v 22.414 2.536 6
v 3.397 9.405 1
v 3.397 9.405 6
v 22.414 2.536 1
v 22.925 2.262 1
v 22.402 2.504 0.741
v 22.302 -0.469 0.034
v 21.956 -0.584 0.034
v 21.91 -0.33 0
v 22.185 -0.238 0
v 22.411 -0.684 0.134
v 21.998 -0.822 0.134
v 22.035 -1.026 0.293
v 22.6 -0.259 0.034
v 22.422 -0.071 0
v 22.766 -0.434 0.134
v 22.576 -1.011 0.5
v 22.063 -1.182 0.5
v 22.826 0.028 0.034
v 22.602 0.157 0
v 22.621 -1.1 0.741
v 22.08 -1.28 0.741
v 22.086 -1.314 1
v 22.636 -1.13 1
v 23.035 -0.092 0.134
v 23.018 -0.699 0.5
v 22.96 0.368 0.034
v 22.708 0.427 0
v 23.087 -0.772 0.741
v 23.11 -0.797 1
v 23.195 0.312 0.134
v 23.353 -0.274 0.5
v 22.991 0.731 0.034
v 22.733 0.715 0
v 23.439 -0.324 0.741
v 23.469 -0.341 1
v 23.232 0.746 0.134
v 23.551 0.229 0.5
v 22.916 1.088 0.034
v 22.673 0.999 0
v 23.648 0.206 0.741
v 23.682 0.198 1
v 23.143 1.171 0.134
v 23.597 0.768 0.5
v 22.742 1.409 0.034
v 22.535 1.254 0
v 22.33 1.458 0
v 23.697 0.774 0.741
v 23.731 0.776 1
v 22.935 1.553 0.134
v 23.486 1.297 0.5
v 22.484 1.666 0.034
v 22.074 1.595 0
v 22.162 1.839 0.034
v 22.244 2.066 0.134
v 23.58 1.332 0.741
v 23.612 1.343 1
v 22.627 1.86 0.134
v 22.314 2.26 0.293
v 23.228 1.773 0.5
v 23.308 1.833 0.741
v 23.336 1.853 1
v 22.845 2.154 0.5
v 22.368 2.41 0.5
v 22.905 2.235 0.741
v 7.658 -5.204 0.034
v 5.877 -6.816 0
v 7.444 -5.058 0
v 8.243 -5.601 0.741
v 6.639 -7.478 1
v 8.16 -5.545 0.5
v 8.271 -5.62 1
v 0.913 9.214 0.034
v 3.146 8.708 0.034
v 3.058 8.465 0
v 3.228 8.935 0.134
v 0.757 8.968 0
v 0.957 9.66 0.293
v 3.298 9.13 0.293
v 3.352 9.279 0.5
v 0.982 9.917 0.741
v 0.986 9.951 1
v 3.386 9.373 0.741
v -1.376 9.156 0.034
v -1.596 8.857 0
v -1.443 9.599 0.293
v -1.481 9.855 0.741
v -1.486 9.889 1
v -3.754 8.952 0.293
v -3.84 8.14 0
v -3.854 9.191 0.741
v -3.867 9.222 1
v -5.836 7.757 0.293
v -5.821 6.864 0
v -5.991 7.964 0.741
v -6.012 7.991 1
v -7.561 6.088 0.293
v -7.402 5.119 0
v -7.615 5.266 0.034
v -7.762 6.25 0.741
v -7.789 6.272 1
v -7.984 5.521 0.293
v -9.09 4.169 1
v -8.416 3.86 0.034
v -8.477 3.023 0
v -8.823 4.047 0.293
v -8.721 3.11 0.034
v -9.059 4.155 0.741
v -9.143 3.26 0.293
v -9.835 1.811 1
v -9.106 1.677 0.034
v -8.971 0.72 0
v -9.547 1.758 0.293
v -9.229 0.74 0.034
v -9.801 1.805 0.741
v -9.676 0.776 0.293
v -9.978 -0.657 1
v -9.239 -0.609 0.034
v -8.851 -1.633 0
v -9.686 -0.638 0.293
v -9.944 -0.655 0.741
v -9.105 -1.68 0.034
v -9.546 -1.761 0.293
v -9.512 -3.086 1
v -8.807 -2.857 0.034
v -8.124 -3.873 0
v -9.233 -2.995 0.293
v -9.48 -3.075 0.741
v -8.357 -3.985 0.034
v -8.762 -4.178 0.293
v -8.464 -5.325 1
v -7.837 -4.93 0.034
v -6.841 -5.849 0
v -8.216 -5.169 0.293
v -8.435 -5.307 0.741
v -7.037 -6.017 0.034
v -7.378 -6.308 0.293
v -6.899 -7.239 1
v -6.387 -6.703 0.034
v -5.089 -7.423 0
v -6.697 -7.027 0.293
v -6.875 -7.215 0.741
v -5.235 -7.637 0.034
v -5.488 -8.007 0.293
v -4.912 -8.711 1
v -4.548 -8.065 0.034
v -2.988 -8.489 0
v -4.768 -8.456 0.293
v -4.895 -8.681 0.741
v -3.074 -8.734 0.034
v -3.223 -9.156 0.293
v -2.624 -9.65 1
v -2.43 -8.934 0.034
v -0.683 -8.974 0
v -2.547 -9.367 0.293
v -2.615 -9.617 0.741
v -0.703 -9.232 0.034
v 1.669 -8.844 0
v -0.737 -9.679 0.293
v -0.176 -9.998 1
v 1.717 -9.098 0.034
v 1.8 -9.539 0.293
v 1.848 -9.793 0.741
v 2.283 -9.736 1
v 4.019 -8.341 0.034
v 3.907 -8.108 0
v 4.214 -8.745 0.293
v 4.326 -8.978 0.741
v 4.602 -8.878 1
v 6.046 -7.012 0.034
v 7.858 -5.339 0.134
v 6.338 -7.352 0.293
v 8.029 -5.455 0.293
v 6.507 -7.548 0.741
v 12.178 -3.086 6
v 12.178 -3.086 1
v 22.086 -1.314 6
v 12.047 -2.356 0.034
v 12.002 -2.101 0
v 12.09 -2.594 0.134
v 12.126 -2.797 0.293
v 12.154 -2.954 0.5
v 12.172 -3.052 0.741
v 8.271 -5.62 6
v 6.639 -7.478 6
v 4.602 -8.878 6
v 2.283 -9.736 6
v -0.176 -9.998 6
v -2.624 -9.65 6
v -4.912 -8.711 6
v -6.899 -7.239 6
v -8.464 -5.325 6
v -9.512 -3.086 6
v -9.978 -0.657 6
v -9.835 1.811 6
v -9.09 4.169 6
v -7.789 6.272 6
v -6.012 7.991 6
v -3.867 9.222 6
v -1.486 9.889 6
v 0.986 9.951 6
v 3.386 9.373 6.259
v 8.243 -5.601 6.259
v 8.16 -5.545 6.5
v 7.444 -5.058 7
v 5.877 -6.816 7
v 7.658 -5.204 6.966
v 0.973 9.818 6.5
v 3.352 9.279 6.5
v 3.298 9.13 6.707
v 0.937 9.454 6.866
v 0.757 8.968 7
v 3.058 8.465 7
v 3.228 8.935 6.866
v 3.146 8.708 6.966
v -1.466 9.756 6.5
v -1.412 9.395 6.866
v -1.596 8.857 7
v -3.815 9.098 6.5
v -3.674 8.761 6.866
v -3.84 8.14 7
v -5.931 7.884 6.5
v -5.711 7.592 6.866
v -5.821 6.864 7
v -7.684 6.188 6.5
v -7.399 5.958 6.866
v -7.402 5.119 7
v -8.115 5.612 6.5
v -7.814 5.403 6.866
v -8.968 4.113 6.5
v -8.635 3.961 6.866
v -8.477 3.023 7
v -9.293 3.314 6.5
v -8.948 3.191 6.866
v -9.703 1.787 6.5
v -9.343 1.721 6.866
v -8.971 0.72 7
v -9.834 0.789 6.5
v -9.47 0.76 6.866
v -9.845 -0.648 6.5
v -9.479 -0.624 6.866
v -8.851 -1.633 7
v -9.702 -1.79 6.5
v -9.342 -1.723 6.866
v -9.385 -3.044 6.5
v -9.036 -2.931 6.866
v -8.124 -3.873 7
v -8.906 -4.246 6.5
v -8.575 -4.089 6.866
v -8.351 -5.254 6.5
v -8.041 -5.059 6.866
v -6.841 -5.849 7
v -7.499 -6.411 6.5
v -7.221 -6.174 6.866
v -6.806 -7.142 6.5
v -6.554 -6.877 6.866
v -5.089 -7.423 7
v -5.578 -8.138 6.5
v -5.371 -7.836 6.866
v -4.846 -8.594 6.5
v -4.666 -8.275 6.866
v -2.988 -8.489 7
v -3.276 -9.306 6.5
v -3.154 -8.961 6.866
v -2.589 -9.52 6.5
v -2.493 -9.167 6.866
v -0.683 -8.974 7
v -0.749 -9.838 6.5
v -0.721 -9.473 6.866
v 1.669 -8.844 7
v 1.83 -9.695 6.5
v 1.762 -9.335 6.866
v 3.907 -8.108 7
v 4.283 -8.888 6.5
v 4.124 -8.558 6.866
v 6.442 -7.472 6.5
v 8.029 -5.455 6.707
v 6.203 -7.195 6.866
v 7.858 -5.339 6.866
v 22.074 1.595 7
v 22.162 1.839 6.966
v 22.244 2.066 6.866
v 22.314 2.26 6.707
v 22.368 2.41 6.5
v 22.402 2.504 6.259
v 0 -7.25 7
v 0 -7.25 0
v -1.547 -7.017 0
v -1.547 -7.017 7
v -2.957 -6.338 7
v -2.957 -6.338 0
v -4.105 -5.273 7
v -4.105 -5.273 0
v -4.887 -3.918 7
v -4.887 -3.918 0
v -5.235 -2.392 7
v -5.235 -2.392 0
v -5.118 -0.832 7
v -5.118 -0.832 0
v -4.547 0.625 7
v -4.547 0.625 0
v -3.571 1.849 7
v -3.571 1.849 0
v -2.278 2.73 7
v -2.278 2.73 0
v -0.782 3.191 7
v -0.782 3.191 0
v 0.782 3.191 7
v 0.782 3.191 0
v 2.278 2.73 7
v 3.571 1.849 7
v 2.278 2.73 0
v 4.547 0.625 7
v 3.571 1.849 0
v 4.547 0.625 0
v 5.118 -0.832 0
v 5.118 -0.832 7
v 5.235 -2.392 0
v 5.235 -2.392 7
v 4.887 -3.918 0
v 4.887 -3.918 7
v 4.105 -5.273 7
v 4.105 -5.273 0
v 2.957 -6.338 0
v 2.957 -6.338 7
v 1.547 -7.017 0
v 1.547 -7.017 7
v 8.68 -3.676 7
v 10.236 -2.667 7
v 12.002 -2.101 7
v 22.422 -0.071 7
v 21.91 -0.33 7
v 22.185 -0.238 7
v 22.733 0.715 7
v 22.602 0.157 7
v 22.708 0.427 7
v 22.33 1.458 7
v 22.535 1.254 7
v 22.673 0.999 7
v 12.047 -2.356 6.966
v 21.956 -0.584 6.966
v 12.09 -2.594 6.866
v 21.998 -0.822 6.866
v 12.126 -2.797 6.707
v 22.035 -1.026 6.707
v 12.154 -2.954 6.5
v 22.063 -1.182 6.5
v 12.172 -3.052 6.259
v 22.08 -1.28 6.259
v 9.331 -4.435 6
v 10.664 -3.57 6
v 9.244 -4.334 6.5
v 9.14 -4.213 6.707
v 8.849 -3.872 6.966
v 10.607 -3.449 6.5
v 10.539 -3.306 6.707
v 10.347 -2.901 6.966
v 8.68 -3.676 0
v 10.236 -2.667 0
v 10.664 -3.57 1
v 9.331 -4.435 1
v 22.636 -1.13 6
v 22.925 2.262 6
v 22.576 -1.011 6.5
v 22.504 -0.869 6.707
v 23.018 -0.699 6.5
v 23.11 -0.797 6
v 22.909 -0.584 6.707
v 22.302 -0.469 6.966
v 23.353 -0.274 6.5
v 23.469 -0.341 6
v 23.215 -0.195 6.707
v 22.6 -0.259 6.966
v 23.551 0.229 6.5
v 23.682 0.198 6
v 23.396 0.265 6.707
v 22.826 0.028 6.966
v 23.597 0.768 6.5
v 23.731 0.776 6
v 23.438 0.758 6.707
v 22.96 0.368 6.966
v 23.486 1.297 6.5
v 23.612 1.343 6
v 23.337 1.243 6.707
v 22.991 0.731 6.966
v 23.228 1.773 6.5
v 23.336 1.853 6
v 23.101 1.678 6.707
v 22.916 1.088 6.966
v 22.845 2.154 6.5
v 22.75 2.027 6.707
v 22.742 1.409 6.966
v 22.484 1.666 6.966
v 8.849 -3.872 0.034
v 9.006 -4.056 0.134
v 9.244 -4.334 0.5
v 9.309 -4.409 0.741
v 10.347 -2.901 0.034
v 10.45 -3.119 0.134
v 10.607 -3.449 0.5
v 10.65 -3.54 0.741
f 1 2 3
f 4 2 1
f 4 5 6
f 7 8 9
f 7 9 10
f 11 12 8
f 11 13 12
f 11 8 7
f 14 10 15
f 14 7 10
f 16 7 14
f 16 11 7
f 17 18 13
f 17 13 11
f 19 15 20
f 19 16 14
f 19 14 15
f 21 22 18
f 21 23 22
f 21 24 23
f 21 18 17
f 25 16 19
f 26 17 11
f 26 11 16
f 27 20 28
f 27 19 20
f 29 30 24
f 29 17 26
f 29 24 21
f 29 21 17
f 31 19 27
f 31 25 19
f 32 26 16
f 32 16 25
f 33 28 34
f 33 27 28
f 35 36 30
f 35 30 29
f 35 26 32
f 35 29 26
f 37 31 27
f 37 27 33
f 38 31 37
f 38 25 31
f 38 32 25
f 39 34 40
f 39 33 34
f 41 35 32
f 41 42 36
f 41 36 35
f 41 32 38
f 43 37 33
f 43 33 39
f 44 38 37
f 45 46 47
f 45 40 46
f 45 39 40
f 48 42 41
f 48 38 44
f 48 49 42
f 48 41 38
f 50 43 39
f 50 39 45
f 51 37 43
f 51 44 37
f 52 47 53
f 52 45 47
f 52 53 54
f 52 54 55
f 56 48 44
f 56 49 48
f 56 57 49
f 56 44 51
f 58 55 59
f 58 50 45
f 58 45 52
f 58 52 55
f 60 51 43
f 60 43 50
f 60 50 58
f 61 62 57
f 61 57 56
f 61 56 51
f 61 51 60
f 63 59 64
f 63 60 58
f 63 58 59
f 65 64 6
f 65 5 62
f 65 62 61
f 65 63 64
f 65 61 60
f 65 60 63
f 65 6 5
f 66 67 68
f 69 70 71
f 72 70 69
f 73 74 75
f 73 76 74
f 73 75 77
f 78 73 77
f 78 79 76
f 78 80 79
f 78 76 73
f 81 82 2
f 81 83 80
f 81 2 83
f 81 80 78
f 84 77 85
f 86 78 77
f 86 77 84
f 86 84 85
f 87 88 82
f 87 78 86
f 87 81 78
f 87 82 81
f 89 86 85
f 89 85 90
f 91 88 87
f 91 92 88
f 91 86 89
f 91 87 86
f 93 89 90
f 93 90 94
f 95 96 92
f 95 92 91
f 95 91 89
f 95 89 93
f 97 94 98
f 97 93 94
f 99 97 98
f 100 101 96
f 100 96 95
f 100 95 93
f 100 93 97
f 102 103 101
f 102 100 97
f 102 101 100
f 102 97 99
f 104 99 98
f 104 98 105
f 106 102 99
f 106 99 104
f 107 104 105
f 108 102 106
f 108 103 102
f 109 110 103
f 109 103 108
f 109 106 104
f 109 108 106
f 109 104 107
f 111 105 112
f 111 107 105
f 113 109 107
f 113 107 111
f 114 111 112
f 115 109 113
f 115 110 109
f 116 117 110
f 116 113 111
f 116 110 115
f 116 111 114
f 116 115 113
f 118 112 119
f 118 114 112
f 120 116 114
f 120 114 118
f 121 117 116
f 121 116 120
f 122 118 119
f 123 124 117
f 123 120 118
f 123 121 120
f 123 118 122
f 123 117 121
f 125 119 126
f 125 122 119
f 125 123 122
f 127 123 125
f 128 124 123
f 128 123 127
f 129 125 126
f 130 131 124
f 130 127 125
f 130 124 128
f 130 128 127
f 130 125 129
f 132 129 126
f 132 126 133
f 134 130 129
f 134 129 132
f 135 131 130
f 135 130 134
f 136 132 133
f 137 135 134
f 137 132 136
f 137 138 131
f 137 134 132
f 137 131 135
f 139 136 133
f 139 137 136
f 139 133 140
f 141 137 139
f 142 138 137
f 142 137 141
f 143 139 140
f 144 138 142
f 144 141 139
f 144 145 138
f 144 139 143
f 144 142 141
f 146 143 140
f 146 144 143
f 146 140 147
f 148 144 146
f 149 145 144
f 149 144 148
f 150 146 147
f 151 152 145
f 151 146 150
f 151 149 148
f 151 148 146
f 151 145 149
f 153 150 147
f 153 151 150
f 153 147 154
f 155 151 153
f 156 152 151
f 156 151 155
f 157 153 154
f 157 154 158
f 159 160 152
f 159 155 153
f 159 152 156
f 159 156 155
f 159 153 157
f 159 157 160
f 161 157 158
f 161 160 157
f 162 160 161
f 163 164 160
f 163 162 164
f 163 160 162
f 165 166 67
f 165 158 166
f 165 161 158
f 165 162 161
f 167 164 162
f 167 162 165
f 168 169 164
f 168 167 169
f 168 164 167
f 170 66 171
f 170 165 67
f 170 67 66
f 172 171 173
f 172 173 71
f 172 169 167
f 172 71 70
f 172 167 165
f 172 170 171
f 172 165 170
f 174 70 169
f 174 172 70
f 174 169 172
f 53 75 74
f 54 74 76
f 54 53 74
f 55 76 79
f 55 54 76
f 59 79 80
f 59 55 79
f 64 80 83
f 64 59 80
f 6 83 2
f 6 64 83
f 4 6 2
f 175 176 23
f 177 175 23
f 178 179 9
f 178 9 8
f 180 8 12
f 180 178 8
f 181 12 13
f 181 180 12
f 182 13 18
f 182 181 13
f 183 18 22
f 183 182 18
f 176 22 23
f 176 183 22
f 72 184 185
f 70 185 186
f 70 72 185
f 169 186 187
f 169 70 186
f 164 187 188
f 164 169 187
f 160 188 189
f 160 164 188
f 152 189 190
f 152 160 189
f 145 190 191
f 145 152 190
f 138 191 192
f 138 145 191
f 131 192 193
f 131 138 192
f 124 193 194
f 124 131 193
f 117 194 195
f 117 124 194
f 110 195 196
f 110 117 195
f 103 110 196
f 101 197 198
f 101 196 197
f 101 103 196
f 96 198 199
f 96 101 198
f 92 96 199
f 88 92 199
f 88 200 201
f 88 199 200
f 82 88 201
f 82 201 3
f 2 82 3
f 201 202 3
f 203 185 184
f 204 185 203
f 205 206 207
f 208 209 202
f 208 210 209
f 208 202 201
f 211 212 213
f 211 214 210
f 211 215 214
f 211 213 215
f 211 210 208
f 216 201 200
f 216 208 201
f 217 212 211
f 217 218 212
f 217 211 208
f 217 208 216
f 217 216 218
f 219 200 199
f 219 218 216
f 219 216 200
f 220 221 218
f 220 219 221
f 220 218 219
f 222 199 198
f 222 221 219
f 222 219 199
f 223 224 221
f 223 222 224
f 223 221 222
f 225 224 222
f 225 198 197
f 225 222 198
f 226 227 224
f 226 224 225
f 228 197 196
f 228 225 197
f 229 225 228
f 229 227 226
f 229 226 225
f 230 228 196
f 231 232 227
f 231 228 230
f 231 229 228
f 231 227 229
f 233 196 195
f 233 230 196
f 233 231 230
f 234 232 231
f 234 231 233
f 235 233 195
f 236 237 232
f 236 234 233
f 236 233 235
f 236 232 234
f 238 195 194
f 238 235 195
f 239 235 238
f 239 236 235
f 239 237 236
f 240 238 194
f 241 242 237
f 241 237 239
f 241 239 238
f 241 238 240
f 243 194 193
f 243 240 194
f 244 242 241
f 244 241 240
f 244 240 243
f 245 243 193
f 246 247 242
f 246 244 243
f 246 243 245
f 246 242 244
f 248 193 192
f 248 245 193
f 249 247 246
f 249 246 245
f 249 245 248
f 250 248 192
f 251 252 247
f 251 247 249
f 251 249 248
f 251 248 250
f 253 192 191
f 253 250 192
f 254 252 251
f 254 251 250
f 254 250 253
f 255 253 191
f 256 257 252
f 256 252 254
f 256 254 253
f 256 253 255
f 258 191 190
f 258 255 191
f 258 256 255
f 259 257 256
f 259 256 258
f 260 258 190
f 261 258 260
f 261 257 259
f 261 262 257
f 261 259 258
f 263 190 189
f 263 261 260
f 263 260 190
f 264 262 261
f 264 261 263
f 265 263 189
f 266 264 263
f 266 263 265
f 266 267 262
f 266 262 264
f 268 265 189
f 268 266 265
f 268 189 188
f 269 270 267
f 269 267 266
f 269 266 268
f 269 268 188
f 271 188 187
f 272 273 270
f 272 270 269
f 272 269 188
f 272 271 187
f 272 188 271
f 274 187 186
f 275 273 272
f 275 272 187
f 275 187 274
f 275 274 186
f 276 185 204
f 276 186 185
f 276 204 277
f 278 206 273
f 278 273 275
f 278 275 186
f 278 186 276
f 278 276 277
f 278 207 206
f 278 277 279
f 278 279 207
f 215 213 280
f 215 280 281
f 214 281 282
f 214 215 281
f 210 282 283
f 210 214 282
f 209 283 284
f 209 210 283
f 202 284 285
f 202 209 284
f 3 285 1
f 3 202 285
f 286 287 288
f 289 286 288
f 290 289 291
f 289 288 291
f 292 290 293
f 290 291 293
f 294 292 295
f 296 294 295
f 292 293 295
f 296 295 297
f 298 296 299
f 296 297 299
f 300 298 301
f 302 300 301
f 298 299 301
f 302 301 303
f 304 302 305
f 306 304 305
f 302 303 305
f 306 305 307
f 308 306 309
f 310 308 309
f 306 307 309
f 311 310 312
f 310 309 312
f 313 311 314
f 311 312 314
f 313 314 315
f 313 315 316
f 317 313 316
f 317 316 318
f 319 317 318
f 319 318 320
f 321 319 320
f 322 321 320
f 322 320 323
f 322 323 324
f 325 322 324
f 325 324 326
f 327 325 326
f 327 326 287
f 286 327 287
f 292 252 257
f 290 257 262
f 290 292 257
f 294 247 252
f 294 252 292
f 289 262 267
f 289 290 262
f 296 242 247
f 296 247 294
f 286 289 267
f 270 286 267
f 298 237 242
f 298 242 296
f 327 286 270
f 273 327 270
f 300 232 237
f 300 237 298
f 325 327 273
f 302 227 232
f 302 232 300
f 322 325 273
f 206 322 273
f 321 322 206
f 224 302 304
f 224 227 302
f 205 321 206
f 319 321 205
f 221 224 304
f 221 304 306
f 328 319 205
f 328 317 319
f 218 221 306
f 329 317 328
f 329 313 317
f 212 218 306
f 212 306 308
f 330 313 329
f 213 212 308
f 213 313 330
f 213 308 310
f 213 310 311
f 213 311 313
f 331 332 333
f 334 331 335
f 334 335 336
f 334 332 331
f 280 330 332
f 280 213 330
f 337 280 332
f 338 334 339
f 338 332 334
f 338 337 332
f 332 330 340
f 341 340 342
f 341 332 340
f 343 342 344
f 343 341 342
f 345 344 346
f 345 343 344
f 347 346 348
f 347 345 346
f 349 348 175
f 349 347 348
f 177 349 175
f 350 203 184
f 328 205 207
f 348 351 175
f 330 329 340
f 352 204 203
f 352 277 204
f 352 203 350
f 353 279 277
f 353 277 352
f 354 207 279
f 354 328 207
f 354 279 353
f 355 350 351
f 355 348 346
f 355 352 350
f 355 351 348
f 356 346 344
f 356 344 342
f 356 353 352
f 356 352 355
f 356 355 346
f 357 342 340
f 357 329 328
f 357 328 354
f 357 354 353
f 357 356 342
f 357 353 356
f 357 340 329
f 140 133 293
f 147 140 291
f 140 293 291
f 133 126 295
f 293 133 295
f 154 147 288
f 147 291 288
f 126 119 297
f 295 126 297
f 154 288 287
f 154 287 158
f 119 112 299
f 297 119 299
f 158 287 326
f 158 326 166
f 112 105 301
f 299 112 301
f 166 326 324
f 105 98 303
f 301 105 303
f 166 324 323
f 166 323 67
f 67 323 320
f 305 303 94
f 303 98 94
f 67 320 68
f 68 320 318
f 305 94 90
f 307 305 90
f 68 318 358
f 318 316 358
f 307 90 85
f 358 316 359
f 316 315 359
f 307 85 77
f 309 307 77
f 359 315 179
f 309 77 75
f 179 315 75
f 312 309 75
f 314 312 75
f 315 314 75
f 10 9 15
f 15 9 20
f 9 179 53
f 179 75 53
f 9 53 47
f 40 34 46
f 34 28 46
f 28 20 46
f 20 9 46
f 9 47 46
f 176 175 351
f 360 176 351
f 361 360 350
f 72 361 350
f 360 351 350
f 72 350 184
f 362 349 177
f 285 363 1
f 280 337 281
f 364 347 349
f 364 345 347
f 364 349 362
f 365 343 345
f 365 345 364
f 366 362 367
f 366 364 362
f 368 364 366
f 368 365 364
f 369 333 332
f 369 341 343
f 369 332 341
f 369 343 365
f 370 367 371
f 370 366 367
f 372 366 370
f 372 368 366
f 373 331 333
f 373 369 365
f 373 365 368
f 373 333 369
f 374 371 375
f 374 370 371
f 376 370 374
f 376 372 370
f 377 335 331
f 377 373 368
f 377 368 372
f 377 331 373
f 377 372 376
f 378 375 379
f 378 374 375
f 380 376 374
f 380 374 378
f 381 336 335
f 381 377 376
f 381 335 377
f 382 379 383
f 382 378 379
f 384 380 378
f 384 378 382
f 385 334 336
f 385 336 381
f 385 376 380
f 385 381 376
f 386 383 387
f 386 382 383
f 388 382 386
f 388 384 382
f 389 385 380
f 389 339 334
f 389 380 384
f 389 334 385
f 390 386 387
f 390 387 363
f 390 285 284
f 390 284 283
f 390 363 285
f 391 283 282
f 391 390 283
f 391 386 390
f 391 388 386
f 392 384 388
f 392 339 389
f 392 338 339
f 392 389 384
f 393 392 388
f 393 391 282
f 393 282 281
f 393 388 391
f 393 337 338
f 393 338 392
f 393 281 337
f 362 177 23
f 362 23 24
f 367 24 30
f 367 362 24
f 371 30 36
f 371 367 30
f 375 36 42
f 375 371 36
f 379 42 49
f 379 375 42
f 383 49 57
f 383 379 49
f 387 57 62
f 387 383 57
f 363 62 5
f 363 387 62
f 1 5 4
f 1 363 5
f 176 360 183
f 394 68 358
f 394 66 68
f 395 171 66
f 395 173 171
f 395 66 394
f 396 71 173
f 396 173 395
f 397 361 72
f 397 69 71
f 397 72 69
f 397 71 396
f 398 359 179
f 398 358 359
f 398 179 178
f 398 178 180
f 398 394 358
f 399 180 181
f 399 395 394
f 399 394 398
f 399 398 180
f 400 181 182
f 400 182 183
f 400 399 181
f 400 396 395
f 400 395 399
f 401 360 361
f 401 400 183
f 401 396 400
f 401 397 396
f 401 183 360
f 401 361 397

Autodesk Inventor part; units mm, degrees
ref_plane "YZ Plane" through (0, 0, 0) normal (1, 0, 0) x (0, 1, 0)
ref_plane "XZ Plane" through (0, 0, 0) normal (0, 1, 0) x (-1, 0, 0)
ref_plane "XY Plane" through (0, 0, 0) normal (0, 0, 1) x (1, 0, 0)
sketch "Sketch1" plane through (0, 0, 0) normal (0, 0, 1) x (1, 0, 0)
  arc A0 (3.3974, 9.4052) -> (9.3315, -3.5948) centre (0, 0) ccw
  line L0 (3.3974, 9.4052) -> (29.434, 0)
  line L1 (9.3315, -3.5948) -> (29.434, 0)
  dimension "d0" = 20
  dimension "d33" = 30
  dimension "d34" = 13
extrude "Extrusion1" add sketch "Sketch1" along normal blind 7
sketch "Sketch2" plane through (0, 0, 7) normal (0, 0, 1) x (1, 0, 0)
  arc A0 (3.3974, 9.4052) -> (9.3315, -3.5948) centre (0, 0) ccw projected
  point P0 (0, -2)
  dimension "d12" = 2
hole "Hole1" at (0, -2, 7) direction (0, 0, -1) diameter 10.5 depth 8 tip angle 118
fillet "Fillet1" radius 2 1 edges at (29.434, 0, 3.5)
fillet "Fillet2" radius 6 1 edges at (9.3315, -3.5948, 3.5)
fillet "Fillet3" radius 1 8 edges at (-9.5121, -3.0855, 7) (17.1322, -2.1999, 7) (23.7272, 0.4854, 7) (12.9056, 5.9705, 7) (23.7272, 0.4854, 0) (12.9056, 5.9705, 0) (-9.5121, -3.0855, 0) (17.1322, -2.1999, 0)
properties part number "ExtruderQuickReleaseTensionCam" material "ABS Plastic"
